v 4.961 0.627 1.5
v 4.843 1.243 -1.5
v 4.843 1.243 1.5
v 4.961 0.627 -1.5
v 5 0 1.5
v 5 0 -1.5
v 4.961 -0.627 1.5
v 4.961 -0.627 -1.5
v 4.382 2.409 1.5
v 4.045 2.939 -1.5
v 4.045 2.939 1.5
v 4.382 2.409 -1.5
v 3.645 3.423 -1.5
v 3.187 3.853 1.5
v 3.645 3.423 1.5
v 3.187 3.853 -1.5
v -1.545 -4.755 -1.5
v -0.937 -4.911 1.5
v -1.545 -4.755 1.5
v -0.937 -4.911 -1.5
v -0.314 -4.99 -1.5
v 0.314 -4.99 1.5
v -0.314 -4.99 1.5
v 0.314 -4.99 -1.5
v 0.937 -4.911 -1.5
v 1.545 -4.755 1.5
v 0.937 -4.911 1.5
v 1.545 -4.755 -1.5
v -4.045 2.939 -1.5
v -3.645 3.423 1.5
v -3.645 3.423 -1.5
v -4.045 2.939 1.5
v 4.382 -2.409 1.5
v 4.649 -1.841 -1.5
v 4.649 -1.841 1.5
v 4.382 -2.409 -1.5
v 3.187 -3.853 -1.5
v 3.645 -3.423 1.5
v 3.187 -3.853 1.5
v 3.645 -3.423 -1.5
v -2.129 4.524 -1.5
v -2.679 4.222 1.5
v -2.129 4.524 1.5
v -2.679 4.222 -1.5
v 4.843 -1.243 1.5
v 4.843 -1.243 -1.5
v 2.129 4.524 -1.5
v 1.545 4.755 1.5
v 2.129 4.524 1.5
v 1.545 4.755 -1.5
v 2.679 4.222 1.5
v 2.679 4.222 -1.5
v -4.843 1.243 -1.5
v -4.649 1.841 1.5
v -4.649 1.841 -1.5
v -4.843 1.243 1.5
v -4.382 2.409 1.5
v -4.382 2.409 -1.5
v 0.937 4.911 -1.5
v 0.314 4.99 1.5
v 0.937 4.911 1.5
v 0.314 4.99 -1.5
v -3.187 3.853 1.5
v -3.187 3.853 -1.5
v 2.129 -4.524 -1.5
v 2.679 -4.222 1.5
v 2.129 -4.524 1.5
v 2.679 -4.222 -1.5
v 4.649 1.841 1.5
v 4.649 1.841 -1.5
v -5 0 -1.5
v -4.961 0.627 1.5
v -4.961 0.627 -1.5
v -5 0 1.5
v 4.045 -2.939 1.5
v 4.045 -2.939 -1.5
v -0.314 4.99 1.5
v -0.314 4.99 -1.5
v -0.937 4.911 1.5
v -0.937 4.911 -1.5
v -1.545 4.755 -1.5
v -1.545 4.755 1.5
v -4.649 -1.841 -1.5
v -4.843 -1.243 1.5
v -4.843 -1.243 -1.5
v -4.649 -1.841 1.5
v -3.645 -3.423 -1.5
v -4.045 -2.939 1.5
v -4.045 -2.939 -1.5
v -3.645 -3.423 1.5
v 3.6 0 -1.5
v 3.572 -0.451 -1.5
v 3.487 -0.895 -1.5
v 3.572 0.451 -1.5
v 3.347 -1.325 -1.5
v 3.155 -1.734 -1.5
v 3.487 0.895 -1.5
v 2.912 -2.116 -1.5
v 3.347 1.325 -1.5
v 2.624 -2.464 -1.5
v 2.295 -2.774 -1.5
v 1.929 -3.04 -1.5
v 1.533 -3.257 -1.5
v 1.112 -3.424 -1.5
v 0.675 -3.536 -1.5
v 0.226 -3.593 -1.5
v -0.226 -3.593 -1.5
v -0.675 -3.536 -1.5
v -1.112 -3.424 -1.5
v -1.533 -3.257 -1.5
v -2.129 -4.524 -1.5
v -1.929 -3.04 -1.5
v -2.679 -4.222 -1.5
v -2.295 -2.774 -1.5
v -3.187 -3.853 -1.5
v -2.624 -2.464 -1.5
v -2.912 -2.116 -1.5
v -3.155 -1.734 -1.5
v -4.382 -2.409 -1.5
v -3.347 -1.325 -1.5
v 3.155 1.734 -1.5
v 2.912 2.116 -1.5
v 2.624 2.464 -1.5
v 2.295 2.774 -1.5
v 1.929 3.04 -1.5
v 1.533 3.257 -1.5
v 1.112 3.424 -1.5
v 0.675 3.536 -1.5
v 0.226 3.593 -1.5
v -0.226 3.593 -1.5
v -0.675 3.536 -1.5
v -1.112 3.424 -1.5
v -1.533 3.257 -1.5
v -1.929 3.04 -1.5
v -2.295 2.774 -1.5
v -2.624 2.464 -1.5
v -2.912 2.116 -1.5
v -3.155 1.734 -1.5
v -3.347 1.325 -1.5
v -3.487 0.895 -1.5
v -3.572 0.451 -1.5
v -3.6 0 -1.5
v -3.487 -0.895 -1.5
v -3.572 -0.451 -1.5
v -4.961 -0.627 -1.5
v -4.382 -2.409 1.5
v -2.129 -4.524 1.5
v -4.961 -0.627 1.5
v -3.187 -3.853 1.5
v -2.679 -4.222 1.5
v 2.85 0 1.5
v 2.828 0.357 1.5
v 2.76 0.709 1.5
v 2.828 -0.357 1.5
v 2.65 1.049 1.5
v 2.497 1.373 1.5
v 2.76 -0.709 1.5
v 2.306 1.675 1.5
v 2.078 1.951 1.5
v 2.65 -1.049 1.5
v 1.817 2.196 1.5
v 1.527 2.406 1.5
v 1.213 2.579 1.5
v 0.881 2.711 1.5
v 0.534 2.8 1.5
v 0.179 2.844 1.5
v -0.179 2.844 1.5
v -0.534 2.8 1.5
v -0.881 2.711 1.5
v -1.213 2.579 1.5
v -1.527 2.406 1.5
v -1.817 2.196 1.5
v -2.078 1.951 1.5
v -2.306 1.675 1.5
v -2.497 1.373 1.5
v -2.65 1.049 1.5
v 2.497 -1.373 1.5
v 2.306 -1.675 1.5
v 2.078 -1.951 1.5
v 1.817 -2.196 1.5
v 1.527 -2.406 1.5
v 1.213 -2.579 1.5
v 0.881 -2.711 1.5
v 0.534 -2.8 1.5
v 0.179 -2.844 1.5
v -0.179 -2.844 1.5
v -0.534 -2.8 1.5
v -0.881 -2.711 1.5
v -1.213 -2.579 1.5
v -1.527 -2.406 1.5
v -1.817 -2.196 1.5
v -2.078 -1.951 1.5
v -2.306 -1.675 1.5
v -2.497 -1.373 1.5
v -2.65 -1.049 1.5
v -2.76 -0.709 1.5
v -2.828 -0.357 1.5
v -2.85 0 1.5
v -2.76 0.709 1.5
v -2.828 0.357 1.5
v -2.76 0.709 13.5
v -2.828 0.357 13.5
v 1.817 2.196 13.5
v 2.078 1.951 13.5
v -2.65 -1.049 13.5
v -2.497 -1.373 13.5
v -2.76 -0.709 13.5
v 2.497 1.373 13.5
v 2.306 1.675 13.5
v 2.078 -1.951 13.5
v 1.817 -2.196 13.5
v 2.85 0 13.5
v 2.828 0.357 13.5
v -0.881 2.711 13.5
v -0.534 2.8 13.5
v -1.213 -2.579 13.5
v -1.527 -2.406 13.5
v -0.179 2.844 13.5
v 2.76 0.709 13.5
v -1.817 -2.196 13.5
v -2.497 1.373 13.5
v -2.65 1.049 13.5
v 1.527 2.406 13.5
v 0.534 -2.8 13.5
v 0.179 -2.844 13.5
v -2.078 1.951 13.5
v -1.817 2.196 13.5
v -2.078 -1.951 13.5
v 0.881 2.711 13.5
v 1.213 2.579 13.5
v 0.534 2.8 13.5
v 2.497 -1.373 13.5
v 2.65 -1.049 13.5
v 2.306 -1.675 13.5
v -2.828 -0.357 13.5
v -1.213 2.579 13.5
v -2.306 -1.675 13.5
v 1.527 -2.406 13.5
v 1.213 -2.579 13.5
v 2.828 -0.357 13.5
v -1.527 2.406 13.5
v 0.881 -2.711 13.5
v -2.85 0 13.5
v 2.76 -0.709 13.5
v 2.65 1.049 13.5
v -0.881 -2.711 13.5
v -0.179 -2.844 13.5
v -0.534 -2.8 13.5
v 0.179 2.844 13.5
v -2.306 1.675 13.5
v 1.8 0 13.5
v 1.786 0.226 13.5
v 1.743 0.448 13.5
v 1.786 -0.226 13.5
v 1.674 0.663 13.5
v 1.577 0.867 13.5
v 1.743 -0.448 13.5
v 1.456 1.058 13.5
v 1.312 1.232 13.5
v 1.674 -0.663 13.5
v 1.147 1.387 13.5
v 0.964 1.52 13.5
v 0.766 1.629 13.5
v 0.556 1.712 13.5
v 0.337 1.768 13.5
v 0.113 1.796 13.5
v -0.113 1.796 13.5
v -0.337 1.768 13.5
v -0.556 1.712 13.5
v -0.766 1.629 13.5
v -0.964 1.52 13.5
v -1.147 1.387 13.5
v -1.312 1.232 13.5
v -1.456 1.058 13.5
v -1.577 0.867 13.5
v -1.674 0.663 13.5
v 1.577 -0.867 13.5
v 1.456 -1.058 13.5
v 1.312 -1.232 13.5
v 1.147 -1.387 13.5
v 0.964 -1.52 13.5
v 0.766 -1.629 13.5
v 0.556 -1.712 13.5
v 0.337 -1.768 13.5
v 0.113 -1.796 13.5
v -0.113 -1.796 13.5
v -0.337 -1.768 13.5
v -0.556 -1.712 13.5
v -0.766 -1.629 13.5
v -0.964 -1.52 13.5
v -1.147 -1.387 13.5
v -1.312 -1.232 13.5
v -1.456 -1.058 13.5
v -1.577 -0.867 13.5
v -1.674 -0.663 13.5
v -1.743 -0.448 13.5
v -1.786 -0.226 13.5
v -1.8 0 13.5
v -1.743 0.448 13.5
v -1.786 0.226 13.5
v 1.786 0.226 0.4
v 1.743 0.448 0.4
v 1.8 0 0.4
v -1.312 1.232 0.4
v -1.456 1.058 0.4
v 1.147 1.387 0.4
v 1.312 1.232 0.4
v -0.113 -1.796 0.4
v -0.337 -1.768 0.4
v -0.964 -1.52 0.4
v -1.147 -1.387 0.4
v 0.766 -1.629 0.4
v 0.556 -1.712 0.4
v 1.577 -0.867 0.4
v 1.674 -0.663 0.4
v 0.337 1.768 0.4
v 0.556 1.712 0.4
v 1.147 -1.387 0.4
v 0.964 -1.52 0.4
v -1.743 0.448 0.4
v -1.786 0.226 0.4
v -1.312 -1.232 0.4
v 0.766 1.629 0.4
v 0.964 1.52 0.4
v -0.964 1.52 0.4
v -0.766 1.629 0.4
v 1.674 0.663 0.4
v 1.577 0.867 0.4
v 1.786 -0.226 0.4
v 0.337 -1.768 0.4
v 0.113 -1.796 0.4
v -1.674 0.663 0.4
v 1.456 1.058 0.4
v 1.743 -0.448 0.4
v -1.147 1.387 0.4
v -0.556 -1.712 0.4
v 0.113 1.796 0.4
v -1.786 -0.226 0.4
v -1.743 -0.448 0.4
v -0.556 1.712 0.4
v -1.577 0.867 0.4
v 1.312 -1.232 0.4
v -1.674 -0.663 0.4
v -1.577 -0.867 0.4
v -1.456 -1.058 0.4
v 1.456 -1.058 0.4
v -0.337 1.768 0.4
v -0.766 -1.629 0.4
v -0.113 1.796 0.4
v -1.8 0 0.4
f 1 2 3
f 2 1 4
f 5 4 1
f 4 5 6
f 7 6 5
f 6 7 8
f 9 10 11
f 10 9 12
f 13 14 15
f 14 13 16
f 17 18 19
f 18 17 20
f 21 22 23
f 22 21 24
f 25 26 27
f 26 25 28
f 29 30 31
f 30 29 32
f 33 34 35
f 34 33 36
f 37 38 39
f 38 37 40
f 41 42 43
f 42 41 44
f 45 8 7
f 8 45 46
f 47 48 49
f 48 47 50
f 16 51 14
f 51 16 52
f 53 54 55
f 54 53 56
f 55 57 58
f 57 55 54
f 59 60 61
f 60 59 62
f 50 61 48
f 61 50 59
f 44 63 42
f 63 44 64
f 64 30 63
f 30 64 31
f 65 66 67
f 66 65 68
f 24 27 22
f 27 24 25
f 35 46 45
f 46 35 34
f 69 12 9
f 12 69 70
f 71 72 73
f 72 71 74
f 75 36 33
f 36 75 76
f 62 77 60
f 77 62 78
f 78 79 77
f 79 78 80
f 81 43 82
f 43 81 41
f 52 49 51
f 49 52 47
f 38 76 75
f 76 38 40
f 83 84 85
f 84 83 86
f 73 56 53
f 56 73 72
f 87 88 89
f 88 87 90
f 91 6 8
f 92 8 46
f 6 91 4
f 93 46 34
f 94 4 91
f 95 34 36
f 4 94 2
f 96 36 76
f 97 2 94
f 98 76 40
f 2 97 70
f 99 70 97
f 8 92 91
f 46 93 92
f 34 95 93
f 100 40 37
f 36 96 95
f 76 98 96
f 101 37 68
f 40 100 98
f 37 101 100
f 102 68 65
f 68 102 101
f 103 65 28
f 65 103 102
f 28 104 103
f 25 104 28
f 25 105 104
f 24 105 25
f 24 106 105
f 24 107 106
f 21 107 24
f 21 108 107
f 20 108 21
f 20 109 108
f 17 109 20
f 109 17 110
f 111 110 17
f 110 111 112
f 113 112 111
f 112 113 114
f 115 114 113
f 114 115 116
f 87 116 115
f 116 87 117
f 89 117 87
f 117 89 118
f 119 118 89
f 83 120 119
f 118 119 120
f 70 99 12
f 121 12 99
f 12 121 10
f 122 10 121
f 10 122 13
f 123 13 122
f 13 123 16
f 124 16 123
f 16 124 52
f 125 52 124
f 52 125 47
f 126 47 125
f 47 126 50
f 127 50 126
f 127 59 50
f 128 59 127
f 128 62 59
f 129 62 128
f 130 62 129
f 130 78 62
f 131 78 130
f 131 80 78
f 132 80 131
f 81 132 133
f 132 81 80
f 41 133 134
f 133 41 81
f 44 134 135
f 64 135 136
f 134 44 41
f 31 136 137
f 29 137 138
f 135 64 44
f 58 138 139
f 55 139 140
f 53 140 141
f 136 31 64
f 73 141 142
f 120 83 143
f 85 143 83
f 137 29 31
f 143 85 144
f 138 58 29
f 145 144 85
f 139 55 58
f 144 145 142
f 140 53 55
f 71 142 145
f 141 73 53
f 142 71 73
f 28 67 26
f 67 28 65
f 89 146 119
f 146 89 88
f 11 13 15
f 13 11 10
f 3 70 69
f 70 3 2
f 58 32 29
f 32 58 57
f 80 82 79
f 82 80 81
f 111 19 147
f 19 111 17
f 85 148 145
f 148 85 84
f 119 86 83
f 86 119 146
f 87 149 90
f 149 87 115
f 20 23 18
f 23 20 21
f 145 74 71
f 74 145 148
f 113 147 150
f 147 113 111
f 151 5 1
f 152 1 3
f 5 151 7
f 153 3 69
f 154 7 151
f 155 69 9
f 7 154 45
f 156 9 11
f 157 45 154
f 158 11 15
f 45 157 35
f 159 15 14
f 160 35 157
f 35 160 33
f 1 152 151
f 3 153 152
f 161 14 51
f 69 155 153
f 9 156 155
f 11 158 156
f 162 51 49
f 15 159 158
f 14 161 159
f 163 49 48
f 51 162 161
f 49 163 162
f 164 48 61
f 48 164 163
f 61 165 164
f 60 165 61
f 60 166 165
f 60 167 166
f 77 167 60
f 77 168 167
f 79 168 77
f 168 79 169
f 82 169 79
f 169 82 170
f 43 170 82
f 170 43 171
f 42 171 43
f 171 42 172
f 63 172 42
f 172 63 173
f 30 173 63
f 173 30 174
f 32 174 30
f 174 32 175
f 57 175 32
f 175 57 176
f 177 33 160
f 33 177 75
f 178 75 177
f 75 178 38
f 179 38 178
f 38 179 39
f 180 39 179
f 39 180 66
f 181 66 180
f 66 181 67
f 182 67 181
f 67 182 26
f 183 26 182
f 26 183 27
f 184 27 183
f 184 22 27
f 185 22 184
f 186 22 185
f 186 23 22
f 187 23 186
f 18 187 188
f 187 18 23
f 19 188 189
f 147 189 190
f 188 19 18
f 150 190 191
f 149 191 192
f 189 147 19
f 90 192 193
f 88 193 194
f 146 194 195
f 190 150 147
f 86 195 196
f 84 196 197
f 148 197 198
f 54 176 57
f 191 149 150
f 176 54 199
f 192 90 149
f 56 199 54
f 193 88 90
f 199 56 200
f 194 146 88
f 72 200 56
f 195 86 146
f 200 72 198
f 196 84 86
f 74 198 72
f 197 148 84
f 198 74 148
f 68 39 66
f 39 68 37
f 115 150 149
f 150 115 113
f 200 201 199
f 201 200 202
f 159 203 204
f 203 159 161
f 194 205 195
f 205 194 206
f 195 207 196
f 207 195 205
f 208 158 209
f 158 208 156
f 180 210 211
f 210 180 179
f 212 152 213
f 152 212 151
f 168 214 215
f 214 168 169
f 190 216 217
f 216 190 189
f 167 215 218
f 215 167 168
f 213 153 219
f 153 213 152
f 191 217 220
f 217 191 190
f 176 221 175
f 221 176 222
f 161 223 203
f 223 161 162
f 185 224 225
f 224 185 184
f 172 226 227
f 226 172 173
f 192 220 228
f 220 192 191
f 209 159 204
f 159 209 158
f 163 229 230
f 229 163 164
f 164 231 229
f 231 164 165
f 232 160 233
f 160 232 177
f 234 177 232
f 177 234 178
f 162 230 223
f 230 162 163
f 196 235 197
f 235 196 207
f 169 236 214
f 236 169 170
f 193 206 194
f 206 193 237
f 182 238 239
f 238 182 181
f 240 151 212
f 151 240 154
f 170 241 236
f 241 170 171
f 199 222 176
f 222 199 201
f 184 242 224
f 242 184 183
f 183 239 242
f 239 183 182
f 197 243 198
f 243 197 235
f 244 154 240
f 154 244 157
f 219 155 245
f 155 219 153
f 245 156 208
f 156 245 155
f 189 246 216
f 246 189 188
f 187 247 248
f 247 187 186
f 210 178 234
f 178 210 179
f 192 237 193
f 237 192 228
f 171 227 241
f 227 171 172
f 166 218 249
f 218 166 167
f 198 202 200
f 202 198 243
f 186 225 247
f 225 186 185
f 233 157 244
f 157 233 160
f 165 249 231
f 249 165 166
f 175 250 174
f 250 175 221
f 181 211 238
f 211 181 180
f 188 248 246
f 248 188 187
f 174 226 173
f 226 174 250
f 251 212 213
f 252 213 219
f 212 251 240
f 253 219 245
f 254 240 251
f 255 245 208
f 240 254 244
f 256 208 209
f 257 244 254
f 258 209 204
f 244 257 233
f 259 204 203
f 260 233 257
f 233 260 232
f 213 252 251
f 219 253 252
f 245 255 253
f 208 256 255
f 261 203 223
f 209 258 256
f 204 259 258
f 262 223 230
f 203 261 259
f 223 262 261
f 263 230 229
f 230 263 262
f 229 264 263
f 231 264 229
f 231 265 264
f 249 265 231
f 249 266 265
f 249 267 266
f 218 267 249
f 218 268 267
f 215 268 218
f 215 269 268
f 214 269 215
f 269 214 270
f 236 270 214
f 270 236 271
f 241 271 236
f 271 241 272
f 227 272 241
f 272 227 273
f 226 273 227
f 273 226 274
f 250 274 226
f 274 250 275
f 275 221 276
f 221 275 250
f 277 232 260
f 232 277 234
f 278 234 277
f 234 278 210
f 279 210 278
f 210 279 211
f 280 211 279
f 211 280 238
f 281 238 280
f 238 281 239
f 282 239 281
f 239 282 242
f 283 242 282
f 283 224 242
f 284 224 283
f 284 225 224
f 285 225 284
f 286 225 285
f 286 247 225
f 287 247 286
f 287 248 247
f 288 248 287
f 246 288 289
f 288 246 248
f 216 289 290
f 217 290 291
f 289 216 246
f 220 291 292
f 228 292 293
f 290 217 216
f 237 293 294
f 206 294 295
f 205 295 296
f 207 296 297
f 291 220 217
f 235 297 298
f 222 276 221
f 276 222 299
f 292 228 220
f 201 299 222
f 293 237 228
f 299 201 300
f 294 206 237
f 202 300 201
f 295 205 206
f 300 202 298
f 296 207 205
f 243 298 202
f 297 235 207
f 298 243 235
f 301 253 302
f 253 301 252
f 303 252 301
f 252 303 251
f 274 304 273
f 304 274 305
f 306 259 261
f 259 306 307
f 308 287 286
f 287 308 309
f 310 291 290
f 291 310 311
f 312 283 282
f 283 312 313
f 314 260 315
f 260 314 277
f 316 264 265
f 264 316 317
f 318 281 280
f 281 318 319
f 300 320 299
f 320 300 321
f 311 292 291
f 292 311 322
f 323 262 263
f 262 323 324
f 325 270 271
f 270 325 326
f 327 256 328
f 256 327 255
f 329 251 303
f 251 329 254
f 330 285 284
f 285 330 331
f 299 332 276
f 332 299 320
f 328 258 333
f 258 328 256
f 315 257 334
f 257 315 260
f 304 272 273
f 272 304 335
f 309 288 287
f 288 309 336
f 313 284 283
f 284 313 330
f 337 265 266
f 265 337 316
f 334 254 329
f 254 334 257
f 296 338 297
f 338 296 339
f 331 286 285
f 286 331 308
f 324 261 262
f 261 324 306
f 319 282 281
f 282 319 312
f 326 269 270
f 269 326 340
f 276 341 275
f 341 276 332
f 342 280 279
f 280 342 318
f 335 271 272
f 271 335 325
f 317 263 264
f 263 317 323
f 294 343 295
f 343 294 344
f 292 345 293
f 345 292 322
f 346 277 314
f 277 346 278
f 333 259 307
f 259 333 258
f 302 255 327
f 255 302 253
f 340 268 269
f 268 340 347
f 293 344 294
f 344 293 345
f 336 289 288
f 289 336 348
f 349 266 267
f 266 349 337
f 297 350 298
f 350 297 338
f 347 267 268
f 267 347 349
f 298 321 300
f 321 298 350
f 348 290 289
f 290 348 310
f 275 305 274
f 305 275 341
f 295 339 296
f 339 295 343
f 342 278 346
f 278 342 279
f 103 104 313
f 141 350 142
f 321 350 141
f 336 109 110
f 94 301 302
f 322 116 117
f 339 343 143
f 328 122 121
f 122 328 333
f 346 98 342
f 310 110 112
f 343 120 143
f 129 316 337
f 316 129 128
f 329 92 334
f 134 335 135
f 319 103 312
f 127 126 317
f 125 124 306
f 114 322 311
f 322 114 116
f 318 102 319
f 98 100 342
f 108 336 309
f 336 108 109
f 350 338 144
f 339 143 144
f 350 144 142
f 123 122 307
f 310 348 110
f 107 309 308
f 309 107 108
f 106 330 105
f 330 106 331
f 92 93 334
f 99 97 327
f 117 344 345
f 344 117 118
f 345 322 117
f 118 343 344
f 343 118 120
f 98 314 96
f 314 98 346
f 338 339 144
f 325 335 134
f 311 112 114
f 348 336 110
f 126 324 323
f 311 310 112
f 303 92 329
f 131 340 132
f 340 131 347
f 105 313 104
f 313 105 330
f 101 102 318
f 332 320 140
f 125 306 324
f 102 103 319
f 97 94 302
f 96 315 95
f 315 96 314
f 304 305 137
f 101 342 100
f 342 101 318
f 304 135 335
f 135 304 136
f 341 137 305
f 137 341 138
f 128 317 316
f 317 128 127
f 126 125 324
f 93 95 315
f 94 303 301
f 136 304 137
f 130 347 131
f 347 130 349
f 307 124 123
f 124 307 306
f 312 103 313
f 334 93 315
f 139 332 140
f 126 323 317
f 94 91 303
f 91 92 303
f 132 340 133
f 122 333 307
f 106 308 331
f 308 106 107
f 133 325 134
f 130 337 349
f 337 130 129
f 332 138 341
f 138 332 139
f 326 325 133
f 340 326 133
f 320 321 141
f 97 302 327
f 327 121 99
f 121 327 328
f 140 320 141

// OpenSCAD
$fn = 50;


difference() {
	union() {
		translate(v = [0, 0, -1.5000000000]) {
			rotate(a = [0, 0, 0]) {
				cylinder(h = 3, r = 5.0000000000);
			}
		}
		translate(v = [0, 0, -1.5000000000]) {
			rotate(a = [0, 0, 0]) {
				cylinder(h = 15, r = 2.8500000000);
			}
		}
	}
	union() {
		translate(v = [0, 0, -125.0000000000]) {
			rotate(a = [0, 0, 0]) {
				cylinder(h = 250, r = 1.8000000000);
			}
		}
		#translate(v = [0, 0, 0.4000000000]) {
			rotate(a = [0, 180, 0]) {
				cylinder(h = 1.9000000000, r1 = 1.8000000000, r2 = 3.6000000000);
			}
		}
		#translate(v = [0, 0, 13.5000000000]) {
			rotate(a = [0, 180, 0]) {
				cylinder(h = 15, r = 1.8000000000);
			}
		}
	}
}
